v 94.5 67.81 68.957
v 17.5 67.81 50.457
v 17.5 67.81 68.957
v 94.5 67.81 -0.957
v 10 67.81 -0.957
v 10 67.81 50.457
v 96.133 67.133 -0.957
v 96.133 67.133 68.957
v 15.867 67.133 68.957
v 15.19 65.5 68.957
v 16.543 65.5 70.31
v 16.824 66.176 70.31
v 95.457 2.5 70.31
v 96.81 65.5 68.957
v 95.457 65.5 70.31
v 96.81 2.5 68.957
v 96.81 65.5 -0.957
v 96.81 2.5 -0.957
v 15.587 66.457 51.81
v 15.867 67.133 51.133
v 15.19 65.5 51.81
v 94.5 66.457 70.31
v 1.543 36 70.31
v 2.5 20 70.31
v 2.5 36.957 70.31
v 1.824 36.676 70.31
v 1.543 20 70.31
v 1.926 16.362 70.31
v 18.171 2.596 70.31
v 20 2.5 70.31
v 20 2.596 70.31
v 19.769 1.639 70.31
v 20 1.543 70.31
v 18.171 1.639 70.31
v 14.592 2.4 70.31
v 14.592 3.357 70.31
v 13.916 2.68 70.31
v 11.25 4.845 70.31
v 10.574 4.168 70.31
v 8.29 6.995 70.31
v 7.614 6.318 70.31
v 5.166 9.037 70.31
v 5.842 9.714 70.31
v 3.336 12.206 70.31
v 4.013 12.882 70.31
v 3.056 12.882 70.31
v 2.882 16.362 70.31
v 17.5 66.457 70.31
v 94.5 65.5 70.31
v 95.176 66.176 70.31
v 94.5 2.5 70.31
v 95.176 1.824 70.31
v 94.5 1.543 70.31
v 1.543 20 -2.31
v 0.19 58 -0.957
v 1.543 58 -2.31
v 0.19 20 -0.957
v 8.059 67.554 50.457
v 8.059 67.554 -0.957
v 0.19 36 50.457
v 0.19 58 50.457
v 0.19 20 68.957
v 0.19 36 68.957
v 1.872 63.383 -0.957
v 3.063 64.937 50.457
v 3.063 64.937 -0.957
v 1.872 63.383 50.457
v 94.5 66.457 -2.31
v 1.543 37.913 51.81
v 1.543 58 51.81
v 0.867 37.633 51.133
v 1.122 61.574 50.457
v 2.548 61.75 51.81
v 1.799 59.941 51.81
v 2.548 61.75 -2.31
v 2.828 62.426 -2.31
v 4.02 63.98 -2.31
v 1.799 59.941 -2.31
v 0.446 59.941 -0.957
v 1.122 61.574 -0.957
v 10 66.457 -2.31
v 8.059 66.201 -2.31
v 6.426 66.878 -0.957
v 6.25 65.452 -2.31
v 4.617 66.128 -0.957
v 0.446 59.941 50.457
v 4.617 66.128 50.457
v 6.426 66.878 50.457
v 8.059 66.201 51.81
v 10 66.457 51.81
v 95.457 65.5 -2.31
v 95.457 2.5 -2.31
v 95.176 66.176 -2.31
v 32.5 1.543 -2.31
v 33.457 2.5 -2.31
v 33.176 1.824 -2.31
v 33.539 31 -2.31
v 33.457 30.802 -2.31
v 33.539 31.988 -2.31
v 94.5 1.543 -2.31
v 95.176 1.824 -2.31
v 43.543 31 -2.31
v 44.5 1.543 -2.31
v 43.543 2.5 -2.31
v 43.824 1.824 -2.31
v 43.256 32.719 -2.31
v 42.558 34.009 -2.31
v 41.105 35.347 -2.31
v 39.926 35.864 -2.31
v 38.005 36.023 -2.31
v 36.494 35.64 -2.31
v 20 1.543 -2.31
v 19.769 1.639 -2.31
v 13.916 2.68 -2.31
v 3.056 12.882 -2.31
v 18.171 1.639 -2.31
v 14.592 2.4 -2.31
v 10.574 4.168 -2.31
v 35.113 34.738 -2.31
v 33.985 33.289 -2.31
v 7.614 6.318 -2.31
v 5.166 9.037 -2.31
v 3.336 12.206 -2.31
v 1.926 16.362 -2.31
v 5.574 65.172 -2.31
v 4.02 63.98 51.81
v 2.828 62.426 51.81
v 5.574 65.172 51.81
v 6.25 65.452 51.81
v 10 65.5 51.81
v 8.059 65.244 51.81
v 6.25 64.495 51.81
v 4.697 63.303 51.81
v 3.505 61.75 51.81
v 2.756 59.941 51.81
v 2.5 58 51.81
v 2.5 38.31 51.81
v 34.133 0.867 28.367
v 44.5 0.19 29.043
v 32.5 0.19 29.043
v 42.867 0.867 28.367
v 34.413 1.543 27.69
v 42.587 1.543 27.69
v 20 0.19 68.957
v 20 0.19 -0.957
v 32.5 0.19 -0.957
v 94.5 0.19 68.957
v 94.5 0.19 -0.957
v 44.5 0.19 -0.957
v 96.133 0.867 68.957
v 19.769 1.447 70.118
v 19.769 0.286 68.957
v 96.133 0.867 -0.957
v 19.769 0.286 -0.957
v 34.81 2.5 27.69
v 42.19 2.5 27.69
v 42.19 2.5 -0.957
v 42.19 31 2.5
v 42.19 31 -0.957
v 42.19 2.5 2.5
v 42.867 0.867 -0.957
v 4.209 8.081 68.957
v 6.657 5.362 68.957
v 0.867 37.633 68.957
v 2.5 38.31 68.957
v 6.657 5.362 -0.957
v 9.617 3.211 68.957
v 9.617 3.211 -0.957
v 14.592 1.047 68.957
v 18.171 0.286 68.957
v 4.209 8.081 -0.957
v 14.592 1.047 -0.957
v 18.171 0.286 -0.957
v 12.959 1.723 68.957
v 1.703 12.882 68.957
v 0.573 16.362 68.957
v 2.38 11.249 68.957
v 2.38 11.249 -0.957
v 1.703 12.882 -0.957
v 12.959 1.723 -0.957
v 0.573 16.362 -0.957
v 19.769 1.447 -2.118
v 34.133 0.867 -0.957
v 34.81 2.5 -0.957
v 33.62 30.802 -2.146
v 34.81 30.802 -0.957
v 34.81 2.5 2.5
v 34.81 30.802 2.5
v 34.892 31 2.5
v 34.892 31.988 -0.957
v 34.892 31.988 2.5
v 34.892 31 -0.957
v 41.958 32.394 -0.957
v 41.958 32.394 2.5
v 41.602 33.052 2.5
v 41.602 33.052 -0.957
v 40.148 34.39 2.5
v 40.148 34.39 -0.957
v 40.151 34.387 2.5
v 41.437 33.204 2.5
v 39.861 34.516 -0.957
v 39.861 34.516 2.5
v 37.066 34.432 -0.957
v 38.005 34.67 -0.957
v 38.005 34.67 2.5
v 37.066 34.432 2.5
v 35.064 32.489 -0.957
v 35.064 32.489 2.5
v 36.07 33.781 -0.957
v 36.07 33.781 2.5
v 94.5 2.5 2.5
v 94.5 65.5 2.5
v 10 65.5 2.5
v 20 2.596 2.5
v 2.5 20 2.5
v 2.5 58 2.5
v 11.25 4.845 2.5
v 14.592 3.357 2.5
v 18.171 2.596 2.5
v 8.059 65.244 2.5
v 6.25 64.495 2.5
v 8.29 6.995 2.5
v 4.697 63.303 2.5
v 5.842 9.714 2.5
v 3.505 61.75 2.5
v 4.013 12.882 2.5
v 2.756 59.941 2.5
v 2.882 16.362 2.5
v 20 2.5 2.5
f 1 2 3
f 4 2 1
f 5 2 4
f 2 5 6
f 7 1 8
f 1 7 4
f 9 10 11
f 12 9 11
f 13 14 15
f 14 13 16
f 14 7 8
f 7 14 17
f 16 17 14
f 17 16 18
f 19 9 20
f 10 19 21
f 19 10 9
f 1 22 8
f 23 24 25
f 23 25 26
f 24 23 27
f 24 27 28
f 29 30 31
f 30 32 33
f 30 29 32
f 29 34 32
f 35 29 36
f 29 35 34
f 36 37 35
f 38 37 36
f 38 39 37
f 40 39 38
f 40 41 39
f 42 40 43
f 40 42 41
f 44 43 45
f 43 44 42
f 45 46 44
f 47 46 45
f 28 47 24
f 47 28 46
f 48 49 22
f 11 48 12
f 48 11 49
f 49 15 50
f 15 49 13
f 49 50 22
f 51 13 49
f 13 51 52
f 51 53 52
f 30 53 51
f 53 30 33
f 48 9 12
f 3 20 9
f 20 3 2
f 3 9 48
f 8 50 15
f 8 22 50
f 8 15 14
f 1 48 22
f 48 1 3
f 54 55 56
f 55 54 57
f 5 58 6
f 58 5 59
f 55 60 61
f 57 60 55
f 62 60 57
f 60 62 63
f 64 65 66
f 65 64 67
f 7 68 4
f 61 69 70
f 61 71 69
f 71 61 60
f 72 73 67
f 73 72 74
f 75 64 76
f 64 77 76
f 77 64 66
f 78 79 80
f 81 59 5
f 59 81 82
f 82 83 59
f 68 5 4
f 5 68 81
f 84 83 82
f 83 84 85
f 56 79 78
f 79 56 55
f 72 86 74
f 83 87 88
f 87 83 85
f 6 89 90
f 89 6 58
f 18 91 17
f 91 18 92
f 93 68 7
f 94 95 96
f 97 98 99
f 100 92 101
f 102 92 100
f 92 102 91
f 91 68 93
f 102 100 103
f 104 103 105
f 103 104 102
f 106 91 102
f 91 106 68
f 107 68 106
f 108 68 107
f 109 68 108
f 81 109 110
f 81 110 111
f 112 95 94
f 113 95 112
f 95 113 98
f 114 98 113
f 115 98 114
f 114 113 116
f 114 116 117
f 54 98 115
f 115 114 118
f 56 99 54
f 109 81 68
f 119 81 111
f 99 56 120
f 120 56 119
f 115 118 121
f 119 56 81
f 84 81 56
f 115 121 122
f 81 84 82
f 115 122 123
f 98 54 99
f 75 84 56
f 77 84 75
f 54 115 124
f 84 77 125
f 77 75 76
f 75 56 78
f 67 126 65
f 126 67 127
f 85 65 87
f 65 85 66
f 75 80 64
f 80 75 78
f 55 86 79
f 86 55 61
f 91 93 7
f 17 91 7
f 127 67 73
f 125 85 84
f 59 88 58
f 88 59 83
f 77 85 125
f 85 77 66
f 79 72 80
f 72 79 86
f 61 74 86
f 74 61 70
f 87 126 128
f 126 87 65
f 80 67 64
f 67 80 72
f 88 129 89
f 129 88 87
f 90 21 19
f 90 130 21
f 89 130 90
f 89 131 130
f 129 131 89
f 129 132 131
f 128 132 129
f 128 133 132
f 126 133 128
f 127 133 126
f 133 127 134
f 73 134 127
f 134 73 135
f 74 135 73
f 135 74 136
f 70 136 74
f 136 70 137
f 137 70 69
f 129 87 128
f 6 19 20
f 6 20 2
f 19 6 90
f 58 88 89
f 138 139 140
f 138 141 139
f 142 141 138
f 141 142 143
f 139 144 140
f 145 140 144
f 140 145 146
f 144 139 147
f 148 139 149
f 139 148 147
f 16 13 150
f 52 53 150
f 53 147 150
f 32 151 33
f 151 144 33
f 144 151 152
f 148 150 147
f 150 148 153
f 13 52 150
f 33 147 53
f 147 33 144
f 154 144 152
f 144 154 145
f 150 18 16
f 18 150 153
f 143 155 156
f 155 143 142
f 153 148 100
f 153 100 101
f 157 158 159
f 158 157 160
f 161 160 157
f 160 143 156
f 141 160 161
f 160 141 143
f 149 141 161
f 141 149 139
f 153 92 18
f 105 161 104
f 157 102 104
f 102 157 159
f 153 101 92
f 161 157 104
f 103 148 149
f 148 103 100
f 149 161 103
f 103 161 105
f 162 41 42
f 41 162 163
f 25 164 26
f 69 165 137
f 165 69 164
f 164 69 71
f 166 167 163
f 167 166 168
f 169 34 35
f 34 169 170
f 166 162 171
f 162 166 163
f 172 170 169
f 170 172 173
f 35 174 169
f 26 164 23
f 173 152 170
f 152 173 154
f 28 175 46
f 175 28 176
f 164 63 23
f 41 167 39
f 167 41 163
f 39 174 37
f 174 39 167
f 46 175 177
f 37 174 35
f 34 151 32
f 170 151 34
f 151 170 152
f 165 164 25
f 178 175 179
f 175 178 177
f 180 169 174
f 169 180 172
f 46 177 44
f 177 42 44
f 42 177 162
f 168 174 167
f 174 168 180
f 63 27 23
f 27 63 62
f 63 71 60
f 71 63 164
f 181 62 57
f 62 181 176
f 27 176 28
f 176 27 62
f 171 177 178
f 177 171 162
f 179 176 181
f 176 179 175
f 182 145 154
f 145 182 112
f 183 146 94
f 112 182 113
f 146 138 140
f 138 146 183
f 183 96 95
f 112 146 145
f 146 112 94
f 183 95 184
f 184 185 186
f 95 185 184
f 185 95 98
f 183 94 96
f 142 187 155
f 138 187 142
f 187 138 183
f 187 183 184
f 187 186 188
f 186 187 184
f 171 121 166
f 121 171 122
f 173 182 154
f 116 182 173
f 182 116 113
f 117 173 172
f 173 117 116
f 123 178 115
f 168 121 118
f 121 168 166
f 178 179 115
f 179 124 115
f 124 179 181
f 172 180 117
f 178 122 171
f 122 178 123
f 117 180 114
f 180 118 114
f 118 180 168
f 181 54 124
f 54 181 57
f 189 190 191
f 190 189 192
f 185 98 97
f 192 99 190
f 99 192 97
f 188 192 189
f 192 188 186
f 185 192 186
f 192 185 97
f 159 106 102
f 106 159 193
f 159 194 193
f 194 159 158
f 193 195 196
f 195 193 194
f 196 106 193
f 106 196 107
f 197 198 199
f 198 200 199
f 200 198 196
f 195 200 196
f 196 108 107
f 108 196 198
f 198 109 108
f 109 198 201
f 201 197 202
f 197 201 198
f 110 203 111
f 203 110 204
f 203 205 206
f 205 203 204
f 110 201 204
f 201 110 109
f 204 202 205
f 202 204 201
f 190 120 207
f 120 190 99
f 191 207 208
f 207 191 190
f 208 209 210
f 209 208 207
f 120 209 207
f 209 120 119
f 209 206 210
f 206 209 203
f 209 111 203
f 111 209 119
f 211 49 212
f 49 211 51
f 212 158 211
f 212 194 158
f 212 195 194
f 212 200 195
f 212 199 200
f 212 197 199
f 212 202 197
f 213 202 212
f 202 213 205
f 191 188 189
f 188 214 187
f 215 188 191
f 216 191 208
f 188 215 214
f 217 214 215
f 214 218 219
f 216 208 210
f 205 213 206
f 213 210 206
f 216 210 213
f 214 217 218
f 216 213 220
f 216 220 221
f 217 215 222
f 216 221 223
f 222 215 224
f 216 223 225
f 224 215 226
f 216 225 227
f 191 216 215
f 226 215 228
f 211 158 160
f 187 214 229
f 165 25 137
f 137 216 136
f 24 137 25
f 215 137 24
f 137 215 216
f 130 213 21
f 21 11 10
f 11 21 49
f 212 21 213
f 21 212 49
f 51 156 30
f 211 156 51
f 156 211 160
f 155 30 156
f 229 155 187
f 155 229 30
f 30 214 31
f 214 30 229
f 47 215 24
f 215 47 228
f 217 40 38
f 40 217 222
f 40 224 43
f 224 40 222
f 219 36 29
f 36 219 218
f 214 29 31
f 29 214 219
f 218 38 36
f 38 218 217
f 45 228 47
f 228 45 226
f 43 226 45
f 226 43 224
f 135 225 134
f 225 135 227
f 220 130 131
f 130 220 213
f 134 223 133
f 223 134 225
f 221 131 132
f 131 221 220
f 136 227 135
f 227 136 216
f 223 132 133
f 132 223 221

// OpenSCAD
module roundCorner() {
}

module rawShell(x,y,z,r1,r2) {
    union() {
        difference() {
            cube([x,y,z]);
            cube([r1,r1,z]);
            translate([0,y-r2,0])
            cube([r2,r2,z]);
        }
        translate([r1,r1,0])
            cylinder(r=r1, h=z);
        translate([r2,y-r2,0])
            cylinder(r=r2, h=z);
    };
}

module shell(x,y,z,w) {
    r1 = 20-w;
    r2 = 10-w;
    h1 = 30;
    translate([w,w,0])
        difference() {
            minkowski() {
                difference() {
                    rawShell(x-2*w,y-2*w,z,r1,r2);
                    translate([0,y-32-w,52-w])
                        cube([15,32,z]);
                    translate([30,0,0]) {
                        cube([12,37-w-6,h1]);
                        translate([6,37-w-6,0])
                            cylinder(r=6,h=h1);
                    }
               }
                sphere(r=w);
            }
            translate([0,0,w])
                rawShell(x-2*w,y-2*w,z,r1,r2);
        }
}

render(convexity=4) {
        shell(97,68,68,2.5);
     
}
